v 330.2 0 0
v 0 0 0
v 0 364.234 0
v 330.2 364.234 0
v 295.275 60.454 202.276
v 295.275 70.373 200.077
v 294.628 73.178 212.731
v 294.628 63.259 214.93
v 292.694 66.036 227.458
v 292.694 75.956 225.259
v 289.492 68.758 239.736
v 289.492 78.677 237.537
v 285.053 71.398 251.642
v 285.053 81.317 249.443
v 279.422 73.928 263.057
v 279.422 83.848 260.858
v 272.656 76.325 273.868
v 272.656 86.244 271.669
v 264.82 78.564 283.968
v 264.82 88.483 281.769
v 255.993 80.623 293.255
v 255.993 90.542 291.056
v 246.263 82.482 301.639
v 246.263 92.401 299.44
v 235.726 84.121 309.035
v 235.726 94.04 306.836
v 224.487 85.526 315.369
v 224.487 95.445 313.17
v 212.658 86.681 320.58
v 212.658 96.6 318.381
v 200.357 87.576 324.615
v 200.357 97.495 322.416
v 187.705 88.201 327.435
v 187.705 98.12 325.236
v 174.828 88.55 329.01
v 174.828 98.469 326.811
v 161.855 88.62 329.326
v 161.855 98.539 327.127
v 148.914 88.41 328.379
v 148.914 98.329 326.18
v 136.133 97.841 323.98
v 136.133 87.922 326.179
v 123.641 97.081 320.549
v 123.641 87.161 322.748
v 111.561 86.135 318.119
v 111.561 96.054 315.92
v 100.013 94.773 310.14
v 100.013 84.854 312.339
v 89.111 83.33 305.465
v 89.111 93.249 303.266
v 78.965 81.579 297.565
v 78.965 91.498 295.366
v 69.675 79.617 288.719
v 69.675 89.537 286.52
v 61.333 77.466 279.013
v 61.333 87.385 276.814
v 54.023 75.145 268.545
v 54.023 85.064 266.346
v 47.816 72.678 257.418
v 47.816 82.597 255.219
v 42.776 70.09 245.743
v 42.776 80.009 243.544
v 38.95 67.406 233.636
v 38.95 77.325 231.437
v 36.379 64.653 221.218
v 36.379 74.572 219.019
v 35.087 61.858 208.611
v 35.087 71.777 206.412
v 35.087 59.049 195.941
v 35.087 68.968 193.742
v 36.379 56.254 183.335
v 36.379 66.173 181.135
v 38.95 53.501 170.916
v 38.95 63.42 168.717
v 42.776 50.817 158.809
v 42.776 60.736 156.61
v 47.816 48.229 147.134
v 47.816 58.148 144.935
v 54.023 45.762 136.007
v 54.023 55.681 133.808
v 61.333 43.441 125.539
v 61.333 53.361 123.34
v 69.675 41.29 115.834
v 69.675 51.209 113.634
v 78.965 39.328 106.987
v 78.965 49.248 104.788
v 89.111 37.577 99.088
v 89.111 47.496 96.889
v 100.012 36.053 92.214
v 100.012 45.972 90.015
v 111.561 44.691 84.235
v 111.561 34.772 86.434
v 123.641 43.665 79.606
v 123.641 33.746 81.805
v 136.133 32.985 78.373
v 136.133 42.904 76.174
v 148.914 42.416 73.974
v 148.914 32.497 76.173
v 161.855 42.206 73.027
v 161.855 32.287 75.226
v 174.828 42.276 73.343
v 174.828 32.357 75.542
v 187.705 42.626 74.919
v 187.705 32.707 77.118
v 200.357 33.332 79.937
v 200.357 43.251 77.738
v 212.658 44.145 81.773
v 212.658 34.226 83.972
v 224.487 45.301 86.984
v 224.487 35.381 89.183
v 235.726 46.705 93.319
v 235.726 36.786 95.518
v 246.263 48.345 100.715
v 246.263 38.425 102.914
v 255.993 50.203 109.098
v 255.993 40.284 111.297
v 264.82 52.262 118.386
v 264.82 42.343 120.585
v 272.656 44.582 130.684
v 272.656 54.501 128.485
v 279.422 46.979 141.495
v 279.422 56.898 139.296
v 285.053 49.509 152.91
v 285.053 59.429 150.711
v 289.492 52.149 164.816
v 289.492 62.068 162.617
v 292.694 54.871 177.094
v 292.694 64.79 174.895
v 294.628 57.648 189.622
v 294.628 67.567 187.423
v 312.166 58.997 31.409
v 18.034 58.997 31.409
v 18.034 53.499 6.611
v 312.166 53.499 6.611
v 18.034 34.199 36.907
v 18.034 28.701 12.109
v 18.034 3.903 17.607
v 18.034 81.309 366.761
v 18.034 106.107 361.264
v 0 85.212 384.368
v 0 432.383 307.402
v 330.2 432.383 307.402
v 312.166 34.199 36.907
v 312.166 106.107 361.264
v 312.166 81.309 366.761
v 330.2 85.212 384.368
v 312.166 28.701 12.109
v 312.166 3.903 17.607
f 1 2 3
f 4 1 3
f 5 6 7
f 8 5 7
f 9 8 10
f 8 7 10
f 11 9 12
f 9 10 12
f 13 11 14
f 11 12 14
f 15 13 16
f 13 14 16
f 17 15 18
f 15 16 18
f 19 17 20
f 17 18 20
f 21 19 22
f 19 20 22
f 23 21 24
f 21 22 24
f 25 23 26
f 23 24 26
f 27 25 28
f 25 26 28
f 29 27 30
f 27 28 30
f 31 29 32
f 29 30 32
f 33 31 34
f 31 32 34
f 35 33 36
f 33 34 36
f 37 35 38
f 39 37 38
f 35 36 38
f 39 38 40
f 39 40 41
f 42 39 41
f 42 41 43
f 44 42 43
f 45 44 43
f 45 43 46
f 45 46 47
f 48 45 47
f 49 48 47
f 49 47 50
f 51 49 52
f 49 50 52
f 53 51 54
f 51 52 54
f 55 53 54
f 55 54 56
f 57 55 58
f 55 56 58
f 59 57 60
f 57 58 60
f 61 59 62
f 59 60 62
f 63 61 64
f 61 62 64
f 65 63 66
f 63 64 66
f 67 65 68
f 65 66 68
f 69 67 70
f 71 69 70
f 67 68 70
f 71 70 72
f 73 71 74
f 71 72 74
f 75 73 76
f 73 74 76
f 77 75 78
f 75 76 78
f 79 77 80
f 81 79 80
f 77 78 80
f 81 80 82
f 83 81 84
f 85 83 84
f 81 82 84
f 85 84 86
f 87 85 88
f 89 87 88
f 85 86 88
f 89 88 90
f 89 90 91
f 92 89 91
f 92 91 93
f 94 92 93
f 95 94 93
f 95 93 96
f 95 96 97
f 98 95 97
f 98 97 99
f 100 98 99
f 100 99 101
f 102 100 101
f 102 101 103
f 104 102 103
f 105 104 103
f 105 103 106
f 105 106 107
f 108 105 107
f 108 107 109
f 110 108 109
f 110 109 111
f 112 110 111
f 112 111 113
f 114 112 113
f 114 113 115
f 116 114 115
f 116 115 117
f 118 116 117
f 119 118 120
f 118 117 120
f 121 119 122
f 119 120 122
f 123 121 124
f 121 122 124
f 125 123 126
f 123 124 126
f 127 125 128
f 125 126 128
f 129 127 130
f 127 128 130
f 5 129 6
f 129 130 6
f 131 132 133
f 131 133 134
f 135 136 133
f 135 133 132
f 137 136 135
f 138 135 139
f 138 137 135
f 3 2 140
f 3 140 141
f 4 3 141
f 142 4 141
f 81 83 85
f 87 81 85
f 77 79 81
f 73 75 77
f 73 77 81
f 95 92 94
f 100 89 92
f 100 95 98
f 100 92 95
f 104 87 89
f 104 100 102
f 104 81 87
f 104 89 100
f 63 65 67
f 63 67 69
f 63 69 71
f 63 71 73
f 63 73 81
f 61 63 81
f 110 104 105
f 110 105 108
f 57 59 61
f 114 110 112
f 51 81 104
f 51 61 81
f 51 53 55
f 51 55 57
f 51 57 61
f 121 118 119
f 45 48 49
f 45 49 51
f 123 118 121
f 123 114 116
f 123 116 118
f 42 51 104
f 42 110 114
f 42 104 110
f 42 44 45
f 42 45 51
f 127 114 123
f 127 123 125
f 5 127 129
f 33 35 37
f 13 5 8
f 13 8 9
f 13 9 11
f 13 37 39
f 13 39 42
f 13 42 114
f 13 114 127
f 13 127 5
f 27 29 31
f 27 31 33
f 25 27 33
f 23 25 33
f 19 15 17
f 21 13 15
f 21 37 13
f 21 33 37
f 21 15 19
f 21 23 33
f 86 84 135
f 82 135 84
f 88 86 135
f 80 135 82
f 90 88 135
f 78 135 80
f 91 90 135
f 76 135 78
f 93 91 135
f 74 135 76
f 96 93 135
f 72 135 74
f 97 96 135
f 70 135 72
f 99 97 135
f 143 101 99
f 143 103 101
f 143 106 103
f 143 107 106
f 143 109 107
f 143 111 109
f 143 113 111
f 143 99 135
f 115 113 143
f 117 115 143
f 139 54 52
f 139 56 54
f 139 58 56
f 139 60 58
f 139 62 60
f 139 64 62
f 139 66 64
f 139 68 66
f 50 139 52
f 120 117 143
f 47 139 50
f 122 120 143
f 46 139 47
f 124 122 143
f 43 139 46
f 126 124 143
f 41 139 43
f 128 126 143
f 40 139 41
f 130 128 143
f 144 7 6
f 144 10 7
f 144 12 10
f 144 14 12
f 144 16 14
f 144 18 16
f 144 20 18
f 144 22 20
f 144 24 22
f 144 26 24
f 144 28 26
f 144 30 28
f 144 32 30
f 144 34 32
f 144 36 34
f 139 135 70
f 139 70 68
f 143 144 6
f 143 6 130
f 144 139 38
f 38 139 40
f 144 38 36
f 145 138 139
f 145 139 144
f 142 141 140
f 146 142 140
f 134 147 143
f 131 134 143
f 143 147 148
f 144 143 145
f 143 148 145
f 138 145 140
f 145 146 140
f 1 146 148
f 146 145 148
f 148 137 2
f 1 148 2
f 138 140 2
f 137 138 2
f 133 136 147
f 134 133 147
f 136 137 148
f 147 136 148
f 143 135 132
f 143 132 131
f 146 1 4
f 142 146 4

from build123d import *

# Parameters (mm, degrees)
F1_DEPTH = 330.2
F2_W     = 294.132
F2_H     = 357.632
F3_DEPTH = 25.4
F4_R     = 130.175
F5_DEPTH = 10.16
F6_W     = 294.132
F6_H     = 25.4
F7_DEPTH = 25.4


with BuildPart() as f1:
    # F0 (on Right) → F1 (new body)
    with BuildSketch(Plane.YZ):
        Polygon((85.2122760074, 384.3677380031), (0, 0), (364.2337952902, 0), (432.3831361393, 307.4018112867), align=None)
    extrude(amount=F1_DEPTH)

    # F2 (on face) → F3 (cut)
    with BuildSketch(Plane(origin=(0, 0, 0), x_dir=(1, 0, 0), z_dir=(0, -0.9762960071, 0.2164396139))):
        with Locations((165.1, 196.85)):
            Rectangle(F2_W, F2_H)
    extrude(amount=-F3_DEPTH, mode=Mode.SUBTRACT)

    # F4 (on face) → F5 (join)
    with BuildSketch(Plane(origin=(0, 24.7979185808, -5.497566194), x_dir=(1, 0, 0), z_dir=(0, -0.9762960071, 0.2164396139))):
        with Locations((165.1, 210.566)):
            Circle(F4_R)
    extrude(amount=F5_DEPTH)

    # F6 (on face) → F7 (cut)
    with BuildSketch(Plane(origin=(0, 24.7979185808, -5.497566194), x_dir=(1, 0, 0), z_dir=(0, -0.9762960071, 0.2164396139))):
        with Locations((165.1, 30.734)):
            Rectangle(F6_W, F6_H)
    extrude(amount=-F7_DEPTH, mode=Mode.SUBTRACT)


solid = f1.part
